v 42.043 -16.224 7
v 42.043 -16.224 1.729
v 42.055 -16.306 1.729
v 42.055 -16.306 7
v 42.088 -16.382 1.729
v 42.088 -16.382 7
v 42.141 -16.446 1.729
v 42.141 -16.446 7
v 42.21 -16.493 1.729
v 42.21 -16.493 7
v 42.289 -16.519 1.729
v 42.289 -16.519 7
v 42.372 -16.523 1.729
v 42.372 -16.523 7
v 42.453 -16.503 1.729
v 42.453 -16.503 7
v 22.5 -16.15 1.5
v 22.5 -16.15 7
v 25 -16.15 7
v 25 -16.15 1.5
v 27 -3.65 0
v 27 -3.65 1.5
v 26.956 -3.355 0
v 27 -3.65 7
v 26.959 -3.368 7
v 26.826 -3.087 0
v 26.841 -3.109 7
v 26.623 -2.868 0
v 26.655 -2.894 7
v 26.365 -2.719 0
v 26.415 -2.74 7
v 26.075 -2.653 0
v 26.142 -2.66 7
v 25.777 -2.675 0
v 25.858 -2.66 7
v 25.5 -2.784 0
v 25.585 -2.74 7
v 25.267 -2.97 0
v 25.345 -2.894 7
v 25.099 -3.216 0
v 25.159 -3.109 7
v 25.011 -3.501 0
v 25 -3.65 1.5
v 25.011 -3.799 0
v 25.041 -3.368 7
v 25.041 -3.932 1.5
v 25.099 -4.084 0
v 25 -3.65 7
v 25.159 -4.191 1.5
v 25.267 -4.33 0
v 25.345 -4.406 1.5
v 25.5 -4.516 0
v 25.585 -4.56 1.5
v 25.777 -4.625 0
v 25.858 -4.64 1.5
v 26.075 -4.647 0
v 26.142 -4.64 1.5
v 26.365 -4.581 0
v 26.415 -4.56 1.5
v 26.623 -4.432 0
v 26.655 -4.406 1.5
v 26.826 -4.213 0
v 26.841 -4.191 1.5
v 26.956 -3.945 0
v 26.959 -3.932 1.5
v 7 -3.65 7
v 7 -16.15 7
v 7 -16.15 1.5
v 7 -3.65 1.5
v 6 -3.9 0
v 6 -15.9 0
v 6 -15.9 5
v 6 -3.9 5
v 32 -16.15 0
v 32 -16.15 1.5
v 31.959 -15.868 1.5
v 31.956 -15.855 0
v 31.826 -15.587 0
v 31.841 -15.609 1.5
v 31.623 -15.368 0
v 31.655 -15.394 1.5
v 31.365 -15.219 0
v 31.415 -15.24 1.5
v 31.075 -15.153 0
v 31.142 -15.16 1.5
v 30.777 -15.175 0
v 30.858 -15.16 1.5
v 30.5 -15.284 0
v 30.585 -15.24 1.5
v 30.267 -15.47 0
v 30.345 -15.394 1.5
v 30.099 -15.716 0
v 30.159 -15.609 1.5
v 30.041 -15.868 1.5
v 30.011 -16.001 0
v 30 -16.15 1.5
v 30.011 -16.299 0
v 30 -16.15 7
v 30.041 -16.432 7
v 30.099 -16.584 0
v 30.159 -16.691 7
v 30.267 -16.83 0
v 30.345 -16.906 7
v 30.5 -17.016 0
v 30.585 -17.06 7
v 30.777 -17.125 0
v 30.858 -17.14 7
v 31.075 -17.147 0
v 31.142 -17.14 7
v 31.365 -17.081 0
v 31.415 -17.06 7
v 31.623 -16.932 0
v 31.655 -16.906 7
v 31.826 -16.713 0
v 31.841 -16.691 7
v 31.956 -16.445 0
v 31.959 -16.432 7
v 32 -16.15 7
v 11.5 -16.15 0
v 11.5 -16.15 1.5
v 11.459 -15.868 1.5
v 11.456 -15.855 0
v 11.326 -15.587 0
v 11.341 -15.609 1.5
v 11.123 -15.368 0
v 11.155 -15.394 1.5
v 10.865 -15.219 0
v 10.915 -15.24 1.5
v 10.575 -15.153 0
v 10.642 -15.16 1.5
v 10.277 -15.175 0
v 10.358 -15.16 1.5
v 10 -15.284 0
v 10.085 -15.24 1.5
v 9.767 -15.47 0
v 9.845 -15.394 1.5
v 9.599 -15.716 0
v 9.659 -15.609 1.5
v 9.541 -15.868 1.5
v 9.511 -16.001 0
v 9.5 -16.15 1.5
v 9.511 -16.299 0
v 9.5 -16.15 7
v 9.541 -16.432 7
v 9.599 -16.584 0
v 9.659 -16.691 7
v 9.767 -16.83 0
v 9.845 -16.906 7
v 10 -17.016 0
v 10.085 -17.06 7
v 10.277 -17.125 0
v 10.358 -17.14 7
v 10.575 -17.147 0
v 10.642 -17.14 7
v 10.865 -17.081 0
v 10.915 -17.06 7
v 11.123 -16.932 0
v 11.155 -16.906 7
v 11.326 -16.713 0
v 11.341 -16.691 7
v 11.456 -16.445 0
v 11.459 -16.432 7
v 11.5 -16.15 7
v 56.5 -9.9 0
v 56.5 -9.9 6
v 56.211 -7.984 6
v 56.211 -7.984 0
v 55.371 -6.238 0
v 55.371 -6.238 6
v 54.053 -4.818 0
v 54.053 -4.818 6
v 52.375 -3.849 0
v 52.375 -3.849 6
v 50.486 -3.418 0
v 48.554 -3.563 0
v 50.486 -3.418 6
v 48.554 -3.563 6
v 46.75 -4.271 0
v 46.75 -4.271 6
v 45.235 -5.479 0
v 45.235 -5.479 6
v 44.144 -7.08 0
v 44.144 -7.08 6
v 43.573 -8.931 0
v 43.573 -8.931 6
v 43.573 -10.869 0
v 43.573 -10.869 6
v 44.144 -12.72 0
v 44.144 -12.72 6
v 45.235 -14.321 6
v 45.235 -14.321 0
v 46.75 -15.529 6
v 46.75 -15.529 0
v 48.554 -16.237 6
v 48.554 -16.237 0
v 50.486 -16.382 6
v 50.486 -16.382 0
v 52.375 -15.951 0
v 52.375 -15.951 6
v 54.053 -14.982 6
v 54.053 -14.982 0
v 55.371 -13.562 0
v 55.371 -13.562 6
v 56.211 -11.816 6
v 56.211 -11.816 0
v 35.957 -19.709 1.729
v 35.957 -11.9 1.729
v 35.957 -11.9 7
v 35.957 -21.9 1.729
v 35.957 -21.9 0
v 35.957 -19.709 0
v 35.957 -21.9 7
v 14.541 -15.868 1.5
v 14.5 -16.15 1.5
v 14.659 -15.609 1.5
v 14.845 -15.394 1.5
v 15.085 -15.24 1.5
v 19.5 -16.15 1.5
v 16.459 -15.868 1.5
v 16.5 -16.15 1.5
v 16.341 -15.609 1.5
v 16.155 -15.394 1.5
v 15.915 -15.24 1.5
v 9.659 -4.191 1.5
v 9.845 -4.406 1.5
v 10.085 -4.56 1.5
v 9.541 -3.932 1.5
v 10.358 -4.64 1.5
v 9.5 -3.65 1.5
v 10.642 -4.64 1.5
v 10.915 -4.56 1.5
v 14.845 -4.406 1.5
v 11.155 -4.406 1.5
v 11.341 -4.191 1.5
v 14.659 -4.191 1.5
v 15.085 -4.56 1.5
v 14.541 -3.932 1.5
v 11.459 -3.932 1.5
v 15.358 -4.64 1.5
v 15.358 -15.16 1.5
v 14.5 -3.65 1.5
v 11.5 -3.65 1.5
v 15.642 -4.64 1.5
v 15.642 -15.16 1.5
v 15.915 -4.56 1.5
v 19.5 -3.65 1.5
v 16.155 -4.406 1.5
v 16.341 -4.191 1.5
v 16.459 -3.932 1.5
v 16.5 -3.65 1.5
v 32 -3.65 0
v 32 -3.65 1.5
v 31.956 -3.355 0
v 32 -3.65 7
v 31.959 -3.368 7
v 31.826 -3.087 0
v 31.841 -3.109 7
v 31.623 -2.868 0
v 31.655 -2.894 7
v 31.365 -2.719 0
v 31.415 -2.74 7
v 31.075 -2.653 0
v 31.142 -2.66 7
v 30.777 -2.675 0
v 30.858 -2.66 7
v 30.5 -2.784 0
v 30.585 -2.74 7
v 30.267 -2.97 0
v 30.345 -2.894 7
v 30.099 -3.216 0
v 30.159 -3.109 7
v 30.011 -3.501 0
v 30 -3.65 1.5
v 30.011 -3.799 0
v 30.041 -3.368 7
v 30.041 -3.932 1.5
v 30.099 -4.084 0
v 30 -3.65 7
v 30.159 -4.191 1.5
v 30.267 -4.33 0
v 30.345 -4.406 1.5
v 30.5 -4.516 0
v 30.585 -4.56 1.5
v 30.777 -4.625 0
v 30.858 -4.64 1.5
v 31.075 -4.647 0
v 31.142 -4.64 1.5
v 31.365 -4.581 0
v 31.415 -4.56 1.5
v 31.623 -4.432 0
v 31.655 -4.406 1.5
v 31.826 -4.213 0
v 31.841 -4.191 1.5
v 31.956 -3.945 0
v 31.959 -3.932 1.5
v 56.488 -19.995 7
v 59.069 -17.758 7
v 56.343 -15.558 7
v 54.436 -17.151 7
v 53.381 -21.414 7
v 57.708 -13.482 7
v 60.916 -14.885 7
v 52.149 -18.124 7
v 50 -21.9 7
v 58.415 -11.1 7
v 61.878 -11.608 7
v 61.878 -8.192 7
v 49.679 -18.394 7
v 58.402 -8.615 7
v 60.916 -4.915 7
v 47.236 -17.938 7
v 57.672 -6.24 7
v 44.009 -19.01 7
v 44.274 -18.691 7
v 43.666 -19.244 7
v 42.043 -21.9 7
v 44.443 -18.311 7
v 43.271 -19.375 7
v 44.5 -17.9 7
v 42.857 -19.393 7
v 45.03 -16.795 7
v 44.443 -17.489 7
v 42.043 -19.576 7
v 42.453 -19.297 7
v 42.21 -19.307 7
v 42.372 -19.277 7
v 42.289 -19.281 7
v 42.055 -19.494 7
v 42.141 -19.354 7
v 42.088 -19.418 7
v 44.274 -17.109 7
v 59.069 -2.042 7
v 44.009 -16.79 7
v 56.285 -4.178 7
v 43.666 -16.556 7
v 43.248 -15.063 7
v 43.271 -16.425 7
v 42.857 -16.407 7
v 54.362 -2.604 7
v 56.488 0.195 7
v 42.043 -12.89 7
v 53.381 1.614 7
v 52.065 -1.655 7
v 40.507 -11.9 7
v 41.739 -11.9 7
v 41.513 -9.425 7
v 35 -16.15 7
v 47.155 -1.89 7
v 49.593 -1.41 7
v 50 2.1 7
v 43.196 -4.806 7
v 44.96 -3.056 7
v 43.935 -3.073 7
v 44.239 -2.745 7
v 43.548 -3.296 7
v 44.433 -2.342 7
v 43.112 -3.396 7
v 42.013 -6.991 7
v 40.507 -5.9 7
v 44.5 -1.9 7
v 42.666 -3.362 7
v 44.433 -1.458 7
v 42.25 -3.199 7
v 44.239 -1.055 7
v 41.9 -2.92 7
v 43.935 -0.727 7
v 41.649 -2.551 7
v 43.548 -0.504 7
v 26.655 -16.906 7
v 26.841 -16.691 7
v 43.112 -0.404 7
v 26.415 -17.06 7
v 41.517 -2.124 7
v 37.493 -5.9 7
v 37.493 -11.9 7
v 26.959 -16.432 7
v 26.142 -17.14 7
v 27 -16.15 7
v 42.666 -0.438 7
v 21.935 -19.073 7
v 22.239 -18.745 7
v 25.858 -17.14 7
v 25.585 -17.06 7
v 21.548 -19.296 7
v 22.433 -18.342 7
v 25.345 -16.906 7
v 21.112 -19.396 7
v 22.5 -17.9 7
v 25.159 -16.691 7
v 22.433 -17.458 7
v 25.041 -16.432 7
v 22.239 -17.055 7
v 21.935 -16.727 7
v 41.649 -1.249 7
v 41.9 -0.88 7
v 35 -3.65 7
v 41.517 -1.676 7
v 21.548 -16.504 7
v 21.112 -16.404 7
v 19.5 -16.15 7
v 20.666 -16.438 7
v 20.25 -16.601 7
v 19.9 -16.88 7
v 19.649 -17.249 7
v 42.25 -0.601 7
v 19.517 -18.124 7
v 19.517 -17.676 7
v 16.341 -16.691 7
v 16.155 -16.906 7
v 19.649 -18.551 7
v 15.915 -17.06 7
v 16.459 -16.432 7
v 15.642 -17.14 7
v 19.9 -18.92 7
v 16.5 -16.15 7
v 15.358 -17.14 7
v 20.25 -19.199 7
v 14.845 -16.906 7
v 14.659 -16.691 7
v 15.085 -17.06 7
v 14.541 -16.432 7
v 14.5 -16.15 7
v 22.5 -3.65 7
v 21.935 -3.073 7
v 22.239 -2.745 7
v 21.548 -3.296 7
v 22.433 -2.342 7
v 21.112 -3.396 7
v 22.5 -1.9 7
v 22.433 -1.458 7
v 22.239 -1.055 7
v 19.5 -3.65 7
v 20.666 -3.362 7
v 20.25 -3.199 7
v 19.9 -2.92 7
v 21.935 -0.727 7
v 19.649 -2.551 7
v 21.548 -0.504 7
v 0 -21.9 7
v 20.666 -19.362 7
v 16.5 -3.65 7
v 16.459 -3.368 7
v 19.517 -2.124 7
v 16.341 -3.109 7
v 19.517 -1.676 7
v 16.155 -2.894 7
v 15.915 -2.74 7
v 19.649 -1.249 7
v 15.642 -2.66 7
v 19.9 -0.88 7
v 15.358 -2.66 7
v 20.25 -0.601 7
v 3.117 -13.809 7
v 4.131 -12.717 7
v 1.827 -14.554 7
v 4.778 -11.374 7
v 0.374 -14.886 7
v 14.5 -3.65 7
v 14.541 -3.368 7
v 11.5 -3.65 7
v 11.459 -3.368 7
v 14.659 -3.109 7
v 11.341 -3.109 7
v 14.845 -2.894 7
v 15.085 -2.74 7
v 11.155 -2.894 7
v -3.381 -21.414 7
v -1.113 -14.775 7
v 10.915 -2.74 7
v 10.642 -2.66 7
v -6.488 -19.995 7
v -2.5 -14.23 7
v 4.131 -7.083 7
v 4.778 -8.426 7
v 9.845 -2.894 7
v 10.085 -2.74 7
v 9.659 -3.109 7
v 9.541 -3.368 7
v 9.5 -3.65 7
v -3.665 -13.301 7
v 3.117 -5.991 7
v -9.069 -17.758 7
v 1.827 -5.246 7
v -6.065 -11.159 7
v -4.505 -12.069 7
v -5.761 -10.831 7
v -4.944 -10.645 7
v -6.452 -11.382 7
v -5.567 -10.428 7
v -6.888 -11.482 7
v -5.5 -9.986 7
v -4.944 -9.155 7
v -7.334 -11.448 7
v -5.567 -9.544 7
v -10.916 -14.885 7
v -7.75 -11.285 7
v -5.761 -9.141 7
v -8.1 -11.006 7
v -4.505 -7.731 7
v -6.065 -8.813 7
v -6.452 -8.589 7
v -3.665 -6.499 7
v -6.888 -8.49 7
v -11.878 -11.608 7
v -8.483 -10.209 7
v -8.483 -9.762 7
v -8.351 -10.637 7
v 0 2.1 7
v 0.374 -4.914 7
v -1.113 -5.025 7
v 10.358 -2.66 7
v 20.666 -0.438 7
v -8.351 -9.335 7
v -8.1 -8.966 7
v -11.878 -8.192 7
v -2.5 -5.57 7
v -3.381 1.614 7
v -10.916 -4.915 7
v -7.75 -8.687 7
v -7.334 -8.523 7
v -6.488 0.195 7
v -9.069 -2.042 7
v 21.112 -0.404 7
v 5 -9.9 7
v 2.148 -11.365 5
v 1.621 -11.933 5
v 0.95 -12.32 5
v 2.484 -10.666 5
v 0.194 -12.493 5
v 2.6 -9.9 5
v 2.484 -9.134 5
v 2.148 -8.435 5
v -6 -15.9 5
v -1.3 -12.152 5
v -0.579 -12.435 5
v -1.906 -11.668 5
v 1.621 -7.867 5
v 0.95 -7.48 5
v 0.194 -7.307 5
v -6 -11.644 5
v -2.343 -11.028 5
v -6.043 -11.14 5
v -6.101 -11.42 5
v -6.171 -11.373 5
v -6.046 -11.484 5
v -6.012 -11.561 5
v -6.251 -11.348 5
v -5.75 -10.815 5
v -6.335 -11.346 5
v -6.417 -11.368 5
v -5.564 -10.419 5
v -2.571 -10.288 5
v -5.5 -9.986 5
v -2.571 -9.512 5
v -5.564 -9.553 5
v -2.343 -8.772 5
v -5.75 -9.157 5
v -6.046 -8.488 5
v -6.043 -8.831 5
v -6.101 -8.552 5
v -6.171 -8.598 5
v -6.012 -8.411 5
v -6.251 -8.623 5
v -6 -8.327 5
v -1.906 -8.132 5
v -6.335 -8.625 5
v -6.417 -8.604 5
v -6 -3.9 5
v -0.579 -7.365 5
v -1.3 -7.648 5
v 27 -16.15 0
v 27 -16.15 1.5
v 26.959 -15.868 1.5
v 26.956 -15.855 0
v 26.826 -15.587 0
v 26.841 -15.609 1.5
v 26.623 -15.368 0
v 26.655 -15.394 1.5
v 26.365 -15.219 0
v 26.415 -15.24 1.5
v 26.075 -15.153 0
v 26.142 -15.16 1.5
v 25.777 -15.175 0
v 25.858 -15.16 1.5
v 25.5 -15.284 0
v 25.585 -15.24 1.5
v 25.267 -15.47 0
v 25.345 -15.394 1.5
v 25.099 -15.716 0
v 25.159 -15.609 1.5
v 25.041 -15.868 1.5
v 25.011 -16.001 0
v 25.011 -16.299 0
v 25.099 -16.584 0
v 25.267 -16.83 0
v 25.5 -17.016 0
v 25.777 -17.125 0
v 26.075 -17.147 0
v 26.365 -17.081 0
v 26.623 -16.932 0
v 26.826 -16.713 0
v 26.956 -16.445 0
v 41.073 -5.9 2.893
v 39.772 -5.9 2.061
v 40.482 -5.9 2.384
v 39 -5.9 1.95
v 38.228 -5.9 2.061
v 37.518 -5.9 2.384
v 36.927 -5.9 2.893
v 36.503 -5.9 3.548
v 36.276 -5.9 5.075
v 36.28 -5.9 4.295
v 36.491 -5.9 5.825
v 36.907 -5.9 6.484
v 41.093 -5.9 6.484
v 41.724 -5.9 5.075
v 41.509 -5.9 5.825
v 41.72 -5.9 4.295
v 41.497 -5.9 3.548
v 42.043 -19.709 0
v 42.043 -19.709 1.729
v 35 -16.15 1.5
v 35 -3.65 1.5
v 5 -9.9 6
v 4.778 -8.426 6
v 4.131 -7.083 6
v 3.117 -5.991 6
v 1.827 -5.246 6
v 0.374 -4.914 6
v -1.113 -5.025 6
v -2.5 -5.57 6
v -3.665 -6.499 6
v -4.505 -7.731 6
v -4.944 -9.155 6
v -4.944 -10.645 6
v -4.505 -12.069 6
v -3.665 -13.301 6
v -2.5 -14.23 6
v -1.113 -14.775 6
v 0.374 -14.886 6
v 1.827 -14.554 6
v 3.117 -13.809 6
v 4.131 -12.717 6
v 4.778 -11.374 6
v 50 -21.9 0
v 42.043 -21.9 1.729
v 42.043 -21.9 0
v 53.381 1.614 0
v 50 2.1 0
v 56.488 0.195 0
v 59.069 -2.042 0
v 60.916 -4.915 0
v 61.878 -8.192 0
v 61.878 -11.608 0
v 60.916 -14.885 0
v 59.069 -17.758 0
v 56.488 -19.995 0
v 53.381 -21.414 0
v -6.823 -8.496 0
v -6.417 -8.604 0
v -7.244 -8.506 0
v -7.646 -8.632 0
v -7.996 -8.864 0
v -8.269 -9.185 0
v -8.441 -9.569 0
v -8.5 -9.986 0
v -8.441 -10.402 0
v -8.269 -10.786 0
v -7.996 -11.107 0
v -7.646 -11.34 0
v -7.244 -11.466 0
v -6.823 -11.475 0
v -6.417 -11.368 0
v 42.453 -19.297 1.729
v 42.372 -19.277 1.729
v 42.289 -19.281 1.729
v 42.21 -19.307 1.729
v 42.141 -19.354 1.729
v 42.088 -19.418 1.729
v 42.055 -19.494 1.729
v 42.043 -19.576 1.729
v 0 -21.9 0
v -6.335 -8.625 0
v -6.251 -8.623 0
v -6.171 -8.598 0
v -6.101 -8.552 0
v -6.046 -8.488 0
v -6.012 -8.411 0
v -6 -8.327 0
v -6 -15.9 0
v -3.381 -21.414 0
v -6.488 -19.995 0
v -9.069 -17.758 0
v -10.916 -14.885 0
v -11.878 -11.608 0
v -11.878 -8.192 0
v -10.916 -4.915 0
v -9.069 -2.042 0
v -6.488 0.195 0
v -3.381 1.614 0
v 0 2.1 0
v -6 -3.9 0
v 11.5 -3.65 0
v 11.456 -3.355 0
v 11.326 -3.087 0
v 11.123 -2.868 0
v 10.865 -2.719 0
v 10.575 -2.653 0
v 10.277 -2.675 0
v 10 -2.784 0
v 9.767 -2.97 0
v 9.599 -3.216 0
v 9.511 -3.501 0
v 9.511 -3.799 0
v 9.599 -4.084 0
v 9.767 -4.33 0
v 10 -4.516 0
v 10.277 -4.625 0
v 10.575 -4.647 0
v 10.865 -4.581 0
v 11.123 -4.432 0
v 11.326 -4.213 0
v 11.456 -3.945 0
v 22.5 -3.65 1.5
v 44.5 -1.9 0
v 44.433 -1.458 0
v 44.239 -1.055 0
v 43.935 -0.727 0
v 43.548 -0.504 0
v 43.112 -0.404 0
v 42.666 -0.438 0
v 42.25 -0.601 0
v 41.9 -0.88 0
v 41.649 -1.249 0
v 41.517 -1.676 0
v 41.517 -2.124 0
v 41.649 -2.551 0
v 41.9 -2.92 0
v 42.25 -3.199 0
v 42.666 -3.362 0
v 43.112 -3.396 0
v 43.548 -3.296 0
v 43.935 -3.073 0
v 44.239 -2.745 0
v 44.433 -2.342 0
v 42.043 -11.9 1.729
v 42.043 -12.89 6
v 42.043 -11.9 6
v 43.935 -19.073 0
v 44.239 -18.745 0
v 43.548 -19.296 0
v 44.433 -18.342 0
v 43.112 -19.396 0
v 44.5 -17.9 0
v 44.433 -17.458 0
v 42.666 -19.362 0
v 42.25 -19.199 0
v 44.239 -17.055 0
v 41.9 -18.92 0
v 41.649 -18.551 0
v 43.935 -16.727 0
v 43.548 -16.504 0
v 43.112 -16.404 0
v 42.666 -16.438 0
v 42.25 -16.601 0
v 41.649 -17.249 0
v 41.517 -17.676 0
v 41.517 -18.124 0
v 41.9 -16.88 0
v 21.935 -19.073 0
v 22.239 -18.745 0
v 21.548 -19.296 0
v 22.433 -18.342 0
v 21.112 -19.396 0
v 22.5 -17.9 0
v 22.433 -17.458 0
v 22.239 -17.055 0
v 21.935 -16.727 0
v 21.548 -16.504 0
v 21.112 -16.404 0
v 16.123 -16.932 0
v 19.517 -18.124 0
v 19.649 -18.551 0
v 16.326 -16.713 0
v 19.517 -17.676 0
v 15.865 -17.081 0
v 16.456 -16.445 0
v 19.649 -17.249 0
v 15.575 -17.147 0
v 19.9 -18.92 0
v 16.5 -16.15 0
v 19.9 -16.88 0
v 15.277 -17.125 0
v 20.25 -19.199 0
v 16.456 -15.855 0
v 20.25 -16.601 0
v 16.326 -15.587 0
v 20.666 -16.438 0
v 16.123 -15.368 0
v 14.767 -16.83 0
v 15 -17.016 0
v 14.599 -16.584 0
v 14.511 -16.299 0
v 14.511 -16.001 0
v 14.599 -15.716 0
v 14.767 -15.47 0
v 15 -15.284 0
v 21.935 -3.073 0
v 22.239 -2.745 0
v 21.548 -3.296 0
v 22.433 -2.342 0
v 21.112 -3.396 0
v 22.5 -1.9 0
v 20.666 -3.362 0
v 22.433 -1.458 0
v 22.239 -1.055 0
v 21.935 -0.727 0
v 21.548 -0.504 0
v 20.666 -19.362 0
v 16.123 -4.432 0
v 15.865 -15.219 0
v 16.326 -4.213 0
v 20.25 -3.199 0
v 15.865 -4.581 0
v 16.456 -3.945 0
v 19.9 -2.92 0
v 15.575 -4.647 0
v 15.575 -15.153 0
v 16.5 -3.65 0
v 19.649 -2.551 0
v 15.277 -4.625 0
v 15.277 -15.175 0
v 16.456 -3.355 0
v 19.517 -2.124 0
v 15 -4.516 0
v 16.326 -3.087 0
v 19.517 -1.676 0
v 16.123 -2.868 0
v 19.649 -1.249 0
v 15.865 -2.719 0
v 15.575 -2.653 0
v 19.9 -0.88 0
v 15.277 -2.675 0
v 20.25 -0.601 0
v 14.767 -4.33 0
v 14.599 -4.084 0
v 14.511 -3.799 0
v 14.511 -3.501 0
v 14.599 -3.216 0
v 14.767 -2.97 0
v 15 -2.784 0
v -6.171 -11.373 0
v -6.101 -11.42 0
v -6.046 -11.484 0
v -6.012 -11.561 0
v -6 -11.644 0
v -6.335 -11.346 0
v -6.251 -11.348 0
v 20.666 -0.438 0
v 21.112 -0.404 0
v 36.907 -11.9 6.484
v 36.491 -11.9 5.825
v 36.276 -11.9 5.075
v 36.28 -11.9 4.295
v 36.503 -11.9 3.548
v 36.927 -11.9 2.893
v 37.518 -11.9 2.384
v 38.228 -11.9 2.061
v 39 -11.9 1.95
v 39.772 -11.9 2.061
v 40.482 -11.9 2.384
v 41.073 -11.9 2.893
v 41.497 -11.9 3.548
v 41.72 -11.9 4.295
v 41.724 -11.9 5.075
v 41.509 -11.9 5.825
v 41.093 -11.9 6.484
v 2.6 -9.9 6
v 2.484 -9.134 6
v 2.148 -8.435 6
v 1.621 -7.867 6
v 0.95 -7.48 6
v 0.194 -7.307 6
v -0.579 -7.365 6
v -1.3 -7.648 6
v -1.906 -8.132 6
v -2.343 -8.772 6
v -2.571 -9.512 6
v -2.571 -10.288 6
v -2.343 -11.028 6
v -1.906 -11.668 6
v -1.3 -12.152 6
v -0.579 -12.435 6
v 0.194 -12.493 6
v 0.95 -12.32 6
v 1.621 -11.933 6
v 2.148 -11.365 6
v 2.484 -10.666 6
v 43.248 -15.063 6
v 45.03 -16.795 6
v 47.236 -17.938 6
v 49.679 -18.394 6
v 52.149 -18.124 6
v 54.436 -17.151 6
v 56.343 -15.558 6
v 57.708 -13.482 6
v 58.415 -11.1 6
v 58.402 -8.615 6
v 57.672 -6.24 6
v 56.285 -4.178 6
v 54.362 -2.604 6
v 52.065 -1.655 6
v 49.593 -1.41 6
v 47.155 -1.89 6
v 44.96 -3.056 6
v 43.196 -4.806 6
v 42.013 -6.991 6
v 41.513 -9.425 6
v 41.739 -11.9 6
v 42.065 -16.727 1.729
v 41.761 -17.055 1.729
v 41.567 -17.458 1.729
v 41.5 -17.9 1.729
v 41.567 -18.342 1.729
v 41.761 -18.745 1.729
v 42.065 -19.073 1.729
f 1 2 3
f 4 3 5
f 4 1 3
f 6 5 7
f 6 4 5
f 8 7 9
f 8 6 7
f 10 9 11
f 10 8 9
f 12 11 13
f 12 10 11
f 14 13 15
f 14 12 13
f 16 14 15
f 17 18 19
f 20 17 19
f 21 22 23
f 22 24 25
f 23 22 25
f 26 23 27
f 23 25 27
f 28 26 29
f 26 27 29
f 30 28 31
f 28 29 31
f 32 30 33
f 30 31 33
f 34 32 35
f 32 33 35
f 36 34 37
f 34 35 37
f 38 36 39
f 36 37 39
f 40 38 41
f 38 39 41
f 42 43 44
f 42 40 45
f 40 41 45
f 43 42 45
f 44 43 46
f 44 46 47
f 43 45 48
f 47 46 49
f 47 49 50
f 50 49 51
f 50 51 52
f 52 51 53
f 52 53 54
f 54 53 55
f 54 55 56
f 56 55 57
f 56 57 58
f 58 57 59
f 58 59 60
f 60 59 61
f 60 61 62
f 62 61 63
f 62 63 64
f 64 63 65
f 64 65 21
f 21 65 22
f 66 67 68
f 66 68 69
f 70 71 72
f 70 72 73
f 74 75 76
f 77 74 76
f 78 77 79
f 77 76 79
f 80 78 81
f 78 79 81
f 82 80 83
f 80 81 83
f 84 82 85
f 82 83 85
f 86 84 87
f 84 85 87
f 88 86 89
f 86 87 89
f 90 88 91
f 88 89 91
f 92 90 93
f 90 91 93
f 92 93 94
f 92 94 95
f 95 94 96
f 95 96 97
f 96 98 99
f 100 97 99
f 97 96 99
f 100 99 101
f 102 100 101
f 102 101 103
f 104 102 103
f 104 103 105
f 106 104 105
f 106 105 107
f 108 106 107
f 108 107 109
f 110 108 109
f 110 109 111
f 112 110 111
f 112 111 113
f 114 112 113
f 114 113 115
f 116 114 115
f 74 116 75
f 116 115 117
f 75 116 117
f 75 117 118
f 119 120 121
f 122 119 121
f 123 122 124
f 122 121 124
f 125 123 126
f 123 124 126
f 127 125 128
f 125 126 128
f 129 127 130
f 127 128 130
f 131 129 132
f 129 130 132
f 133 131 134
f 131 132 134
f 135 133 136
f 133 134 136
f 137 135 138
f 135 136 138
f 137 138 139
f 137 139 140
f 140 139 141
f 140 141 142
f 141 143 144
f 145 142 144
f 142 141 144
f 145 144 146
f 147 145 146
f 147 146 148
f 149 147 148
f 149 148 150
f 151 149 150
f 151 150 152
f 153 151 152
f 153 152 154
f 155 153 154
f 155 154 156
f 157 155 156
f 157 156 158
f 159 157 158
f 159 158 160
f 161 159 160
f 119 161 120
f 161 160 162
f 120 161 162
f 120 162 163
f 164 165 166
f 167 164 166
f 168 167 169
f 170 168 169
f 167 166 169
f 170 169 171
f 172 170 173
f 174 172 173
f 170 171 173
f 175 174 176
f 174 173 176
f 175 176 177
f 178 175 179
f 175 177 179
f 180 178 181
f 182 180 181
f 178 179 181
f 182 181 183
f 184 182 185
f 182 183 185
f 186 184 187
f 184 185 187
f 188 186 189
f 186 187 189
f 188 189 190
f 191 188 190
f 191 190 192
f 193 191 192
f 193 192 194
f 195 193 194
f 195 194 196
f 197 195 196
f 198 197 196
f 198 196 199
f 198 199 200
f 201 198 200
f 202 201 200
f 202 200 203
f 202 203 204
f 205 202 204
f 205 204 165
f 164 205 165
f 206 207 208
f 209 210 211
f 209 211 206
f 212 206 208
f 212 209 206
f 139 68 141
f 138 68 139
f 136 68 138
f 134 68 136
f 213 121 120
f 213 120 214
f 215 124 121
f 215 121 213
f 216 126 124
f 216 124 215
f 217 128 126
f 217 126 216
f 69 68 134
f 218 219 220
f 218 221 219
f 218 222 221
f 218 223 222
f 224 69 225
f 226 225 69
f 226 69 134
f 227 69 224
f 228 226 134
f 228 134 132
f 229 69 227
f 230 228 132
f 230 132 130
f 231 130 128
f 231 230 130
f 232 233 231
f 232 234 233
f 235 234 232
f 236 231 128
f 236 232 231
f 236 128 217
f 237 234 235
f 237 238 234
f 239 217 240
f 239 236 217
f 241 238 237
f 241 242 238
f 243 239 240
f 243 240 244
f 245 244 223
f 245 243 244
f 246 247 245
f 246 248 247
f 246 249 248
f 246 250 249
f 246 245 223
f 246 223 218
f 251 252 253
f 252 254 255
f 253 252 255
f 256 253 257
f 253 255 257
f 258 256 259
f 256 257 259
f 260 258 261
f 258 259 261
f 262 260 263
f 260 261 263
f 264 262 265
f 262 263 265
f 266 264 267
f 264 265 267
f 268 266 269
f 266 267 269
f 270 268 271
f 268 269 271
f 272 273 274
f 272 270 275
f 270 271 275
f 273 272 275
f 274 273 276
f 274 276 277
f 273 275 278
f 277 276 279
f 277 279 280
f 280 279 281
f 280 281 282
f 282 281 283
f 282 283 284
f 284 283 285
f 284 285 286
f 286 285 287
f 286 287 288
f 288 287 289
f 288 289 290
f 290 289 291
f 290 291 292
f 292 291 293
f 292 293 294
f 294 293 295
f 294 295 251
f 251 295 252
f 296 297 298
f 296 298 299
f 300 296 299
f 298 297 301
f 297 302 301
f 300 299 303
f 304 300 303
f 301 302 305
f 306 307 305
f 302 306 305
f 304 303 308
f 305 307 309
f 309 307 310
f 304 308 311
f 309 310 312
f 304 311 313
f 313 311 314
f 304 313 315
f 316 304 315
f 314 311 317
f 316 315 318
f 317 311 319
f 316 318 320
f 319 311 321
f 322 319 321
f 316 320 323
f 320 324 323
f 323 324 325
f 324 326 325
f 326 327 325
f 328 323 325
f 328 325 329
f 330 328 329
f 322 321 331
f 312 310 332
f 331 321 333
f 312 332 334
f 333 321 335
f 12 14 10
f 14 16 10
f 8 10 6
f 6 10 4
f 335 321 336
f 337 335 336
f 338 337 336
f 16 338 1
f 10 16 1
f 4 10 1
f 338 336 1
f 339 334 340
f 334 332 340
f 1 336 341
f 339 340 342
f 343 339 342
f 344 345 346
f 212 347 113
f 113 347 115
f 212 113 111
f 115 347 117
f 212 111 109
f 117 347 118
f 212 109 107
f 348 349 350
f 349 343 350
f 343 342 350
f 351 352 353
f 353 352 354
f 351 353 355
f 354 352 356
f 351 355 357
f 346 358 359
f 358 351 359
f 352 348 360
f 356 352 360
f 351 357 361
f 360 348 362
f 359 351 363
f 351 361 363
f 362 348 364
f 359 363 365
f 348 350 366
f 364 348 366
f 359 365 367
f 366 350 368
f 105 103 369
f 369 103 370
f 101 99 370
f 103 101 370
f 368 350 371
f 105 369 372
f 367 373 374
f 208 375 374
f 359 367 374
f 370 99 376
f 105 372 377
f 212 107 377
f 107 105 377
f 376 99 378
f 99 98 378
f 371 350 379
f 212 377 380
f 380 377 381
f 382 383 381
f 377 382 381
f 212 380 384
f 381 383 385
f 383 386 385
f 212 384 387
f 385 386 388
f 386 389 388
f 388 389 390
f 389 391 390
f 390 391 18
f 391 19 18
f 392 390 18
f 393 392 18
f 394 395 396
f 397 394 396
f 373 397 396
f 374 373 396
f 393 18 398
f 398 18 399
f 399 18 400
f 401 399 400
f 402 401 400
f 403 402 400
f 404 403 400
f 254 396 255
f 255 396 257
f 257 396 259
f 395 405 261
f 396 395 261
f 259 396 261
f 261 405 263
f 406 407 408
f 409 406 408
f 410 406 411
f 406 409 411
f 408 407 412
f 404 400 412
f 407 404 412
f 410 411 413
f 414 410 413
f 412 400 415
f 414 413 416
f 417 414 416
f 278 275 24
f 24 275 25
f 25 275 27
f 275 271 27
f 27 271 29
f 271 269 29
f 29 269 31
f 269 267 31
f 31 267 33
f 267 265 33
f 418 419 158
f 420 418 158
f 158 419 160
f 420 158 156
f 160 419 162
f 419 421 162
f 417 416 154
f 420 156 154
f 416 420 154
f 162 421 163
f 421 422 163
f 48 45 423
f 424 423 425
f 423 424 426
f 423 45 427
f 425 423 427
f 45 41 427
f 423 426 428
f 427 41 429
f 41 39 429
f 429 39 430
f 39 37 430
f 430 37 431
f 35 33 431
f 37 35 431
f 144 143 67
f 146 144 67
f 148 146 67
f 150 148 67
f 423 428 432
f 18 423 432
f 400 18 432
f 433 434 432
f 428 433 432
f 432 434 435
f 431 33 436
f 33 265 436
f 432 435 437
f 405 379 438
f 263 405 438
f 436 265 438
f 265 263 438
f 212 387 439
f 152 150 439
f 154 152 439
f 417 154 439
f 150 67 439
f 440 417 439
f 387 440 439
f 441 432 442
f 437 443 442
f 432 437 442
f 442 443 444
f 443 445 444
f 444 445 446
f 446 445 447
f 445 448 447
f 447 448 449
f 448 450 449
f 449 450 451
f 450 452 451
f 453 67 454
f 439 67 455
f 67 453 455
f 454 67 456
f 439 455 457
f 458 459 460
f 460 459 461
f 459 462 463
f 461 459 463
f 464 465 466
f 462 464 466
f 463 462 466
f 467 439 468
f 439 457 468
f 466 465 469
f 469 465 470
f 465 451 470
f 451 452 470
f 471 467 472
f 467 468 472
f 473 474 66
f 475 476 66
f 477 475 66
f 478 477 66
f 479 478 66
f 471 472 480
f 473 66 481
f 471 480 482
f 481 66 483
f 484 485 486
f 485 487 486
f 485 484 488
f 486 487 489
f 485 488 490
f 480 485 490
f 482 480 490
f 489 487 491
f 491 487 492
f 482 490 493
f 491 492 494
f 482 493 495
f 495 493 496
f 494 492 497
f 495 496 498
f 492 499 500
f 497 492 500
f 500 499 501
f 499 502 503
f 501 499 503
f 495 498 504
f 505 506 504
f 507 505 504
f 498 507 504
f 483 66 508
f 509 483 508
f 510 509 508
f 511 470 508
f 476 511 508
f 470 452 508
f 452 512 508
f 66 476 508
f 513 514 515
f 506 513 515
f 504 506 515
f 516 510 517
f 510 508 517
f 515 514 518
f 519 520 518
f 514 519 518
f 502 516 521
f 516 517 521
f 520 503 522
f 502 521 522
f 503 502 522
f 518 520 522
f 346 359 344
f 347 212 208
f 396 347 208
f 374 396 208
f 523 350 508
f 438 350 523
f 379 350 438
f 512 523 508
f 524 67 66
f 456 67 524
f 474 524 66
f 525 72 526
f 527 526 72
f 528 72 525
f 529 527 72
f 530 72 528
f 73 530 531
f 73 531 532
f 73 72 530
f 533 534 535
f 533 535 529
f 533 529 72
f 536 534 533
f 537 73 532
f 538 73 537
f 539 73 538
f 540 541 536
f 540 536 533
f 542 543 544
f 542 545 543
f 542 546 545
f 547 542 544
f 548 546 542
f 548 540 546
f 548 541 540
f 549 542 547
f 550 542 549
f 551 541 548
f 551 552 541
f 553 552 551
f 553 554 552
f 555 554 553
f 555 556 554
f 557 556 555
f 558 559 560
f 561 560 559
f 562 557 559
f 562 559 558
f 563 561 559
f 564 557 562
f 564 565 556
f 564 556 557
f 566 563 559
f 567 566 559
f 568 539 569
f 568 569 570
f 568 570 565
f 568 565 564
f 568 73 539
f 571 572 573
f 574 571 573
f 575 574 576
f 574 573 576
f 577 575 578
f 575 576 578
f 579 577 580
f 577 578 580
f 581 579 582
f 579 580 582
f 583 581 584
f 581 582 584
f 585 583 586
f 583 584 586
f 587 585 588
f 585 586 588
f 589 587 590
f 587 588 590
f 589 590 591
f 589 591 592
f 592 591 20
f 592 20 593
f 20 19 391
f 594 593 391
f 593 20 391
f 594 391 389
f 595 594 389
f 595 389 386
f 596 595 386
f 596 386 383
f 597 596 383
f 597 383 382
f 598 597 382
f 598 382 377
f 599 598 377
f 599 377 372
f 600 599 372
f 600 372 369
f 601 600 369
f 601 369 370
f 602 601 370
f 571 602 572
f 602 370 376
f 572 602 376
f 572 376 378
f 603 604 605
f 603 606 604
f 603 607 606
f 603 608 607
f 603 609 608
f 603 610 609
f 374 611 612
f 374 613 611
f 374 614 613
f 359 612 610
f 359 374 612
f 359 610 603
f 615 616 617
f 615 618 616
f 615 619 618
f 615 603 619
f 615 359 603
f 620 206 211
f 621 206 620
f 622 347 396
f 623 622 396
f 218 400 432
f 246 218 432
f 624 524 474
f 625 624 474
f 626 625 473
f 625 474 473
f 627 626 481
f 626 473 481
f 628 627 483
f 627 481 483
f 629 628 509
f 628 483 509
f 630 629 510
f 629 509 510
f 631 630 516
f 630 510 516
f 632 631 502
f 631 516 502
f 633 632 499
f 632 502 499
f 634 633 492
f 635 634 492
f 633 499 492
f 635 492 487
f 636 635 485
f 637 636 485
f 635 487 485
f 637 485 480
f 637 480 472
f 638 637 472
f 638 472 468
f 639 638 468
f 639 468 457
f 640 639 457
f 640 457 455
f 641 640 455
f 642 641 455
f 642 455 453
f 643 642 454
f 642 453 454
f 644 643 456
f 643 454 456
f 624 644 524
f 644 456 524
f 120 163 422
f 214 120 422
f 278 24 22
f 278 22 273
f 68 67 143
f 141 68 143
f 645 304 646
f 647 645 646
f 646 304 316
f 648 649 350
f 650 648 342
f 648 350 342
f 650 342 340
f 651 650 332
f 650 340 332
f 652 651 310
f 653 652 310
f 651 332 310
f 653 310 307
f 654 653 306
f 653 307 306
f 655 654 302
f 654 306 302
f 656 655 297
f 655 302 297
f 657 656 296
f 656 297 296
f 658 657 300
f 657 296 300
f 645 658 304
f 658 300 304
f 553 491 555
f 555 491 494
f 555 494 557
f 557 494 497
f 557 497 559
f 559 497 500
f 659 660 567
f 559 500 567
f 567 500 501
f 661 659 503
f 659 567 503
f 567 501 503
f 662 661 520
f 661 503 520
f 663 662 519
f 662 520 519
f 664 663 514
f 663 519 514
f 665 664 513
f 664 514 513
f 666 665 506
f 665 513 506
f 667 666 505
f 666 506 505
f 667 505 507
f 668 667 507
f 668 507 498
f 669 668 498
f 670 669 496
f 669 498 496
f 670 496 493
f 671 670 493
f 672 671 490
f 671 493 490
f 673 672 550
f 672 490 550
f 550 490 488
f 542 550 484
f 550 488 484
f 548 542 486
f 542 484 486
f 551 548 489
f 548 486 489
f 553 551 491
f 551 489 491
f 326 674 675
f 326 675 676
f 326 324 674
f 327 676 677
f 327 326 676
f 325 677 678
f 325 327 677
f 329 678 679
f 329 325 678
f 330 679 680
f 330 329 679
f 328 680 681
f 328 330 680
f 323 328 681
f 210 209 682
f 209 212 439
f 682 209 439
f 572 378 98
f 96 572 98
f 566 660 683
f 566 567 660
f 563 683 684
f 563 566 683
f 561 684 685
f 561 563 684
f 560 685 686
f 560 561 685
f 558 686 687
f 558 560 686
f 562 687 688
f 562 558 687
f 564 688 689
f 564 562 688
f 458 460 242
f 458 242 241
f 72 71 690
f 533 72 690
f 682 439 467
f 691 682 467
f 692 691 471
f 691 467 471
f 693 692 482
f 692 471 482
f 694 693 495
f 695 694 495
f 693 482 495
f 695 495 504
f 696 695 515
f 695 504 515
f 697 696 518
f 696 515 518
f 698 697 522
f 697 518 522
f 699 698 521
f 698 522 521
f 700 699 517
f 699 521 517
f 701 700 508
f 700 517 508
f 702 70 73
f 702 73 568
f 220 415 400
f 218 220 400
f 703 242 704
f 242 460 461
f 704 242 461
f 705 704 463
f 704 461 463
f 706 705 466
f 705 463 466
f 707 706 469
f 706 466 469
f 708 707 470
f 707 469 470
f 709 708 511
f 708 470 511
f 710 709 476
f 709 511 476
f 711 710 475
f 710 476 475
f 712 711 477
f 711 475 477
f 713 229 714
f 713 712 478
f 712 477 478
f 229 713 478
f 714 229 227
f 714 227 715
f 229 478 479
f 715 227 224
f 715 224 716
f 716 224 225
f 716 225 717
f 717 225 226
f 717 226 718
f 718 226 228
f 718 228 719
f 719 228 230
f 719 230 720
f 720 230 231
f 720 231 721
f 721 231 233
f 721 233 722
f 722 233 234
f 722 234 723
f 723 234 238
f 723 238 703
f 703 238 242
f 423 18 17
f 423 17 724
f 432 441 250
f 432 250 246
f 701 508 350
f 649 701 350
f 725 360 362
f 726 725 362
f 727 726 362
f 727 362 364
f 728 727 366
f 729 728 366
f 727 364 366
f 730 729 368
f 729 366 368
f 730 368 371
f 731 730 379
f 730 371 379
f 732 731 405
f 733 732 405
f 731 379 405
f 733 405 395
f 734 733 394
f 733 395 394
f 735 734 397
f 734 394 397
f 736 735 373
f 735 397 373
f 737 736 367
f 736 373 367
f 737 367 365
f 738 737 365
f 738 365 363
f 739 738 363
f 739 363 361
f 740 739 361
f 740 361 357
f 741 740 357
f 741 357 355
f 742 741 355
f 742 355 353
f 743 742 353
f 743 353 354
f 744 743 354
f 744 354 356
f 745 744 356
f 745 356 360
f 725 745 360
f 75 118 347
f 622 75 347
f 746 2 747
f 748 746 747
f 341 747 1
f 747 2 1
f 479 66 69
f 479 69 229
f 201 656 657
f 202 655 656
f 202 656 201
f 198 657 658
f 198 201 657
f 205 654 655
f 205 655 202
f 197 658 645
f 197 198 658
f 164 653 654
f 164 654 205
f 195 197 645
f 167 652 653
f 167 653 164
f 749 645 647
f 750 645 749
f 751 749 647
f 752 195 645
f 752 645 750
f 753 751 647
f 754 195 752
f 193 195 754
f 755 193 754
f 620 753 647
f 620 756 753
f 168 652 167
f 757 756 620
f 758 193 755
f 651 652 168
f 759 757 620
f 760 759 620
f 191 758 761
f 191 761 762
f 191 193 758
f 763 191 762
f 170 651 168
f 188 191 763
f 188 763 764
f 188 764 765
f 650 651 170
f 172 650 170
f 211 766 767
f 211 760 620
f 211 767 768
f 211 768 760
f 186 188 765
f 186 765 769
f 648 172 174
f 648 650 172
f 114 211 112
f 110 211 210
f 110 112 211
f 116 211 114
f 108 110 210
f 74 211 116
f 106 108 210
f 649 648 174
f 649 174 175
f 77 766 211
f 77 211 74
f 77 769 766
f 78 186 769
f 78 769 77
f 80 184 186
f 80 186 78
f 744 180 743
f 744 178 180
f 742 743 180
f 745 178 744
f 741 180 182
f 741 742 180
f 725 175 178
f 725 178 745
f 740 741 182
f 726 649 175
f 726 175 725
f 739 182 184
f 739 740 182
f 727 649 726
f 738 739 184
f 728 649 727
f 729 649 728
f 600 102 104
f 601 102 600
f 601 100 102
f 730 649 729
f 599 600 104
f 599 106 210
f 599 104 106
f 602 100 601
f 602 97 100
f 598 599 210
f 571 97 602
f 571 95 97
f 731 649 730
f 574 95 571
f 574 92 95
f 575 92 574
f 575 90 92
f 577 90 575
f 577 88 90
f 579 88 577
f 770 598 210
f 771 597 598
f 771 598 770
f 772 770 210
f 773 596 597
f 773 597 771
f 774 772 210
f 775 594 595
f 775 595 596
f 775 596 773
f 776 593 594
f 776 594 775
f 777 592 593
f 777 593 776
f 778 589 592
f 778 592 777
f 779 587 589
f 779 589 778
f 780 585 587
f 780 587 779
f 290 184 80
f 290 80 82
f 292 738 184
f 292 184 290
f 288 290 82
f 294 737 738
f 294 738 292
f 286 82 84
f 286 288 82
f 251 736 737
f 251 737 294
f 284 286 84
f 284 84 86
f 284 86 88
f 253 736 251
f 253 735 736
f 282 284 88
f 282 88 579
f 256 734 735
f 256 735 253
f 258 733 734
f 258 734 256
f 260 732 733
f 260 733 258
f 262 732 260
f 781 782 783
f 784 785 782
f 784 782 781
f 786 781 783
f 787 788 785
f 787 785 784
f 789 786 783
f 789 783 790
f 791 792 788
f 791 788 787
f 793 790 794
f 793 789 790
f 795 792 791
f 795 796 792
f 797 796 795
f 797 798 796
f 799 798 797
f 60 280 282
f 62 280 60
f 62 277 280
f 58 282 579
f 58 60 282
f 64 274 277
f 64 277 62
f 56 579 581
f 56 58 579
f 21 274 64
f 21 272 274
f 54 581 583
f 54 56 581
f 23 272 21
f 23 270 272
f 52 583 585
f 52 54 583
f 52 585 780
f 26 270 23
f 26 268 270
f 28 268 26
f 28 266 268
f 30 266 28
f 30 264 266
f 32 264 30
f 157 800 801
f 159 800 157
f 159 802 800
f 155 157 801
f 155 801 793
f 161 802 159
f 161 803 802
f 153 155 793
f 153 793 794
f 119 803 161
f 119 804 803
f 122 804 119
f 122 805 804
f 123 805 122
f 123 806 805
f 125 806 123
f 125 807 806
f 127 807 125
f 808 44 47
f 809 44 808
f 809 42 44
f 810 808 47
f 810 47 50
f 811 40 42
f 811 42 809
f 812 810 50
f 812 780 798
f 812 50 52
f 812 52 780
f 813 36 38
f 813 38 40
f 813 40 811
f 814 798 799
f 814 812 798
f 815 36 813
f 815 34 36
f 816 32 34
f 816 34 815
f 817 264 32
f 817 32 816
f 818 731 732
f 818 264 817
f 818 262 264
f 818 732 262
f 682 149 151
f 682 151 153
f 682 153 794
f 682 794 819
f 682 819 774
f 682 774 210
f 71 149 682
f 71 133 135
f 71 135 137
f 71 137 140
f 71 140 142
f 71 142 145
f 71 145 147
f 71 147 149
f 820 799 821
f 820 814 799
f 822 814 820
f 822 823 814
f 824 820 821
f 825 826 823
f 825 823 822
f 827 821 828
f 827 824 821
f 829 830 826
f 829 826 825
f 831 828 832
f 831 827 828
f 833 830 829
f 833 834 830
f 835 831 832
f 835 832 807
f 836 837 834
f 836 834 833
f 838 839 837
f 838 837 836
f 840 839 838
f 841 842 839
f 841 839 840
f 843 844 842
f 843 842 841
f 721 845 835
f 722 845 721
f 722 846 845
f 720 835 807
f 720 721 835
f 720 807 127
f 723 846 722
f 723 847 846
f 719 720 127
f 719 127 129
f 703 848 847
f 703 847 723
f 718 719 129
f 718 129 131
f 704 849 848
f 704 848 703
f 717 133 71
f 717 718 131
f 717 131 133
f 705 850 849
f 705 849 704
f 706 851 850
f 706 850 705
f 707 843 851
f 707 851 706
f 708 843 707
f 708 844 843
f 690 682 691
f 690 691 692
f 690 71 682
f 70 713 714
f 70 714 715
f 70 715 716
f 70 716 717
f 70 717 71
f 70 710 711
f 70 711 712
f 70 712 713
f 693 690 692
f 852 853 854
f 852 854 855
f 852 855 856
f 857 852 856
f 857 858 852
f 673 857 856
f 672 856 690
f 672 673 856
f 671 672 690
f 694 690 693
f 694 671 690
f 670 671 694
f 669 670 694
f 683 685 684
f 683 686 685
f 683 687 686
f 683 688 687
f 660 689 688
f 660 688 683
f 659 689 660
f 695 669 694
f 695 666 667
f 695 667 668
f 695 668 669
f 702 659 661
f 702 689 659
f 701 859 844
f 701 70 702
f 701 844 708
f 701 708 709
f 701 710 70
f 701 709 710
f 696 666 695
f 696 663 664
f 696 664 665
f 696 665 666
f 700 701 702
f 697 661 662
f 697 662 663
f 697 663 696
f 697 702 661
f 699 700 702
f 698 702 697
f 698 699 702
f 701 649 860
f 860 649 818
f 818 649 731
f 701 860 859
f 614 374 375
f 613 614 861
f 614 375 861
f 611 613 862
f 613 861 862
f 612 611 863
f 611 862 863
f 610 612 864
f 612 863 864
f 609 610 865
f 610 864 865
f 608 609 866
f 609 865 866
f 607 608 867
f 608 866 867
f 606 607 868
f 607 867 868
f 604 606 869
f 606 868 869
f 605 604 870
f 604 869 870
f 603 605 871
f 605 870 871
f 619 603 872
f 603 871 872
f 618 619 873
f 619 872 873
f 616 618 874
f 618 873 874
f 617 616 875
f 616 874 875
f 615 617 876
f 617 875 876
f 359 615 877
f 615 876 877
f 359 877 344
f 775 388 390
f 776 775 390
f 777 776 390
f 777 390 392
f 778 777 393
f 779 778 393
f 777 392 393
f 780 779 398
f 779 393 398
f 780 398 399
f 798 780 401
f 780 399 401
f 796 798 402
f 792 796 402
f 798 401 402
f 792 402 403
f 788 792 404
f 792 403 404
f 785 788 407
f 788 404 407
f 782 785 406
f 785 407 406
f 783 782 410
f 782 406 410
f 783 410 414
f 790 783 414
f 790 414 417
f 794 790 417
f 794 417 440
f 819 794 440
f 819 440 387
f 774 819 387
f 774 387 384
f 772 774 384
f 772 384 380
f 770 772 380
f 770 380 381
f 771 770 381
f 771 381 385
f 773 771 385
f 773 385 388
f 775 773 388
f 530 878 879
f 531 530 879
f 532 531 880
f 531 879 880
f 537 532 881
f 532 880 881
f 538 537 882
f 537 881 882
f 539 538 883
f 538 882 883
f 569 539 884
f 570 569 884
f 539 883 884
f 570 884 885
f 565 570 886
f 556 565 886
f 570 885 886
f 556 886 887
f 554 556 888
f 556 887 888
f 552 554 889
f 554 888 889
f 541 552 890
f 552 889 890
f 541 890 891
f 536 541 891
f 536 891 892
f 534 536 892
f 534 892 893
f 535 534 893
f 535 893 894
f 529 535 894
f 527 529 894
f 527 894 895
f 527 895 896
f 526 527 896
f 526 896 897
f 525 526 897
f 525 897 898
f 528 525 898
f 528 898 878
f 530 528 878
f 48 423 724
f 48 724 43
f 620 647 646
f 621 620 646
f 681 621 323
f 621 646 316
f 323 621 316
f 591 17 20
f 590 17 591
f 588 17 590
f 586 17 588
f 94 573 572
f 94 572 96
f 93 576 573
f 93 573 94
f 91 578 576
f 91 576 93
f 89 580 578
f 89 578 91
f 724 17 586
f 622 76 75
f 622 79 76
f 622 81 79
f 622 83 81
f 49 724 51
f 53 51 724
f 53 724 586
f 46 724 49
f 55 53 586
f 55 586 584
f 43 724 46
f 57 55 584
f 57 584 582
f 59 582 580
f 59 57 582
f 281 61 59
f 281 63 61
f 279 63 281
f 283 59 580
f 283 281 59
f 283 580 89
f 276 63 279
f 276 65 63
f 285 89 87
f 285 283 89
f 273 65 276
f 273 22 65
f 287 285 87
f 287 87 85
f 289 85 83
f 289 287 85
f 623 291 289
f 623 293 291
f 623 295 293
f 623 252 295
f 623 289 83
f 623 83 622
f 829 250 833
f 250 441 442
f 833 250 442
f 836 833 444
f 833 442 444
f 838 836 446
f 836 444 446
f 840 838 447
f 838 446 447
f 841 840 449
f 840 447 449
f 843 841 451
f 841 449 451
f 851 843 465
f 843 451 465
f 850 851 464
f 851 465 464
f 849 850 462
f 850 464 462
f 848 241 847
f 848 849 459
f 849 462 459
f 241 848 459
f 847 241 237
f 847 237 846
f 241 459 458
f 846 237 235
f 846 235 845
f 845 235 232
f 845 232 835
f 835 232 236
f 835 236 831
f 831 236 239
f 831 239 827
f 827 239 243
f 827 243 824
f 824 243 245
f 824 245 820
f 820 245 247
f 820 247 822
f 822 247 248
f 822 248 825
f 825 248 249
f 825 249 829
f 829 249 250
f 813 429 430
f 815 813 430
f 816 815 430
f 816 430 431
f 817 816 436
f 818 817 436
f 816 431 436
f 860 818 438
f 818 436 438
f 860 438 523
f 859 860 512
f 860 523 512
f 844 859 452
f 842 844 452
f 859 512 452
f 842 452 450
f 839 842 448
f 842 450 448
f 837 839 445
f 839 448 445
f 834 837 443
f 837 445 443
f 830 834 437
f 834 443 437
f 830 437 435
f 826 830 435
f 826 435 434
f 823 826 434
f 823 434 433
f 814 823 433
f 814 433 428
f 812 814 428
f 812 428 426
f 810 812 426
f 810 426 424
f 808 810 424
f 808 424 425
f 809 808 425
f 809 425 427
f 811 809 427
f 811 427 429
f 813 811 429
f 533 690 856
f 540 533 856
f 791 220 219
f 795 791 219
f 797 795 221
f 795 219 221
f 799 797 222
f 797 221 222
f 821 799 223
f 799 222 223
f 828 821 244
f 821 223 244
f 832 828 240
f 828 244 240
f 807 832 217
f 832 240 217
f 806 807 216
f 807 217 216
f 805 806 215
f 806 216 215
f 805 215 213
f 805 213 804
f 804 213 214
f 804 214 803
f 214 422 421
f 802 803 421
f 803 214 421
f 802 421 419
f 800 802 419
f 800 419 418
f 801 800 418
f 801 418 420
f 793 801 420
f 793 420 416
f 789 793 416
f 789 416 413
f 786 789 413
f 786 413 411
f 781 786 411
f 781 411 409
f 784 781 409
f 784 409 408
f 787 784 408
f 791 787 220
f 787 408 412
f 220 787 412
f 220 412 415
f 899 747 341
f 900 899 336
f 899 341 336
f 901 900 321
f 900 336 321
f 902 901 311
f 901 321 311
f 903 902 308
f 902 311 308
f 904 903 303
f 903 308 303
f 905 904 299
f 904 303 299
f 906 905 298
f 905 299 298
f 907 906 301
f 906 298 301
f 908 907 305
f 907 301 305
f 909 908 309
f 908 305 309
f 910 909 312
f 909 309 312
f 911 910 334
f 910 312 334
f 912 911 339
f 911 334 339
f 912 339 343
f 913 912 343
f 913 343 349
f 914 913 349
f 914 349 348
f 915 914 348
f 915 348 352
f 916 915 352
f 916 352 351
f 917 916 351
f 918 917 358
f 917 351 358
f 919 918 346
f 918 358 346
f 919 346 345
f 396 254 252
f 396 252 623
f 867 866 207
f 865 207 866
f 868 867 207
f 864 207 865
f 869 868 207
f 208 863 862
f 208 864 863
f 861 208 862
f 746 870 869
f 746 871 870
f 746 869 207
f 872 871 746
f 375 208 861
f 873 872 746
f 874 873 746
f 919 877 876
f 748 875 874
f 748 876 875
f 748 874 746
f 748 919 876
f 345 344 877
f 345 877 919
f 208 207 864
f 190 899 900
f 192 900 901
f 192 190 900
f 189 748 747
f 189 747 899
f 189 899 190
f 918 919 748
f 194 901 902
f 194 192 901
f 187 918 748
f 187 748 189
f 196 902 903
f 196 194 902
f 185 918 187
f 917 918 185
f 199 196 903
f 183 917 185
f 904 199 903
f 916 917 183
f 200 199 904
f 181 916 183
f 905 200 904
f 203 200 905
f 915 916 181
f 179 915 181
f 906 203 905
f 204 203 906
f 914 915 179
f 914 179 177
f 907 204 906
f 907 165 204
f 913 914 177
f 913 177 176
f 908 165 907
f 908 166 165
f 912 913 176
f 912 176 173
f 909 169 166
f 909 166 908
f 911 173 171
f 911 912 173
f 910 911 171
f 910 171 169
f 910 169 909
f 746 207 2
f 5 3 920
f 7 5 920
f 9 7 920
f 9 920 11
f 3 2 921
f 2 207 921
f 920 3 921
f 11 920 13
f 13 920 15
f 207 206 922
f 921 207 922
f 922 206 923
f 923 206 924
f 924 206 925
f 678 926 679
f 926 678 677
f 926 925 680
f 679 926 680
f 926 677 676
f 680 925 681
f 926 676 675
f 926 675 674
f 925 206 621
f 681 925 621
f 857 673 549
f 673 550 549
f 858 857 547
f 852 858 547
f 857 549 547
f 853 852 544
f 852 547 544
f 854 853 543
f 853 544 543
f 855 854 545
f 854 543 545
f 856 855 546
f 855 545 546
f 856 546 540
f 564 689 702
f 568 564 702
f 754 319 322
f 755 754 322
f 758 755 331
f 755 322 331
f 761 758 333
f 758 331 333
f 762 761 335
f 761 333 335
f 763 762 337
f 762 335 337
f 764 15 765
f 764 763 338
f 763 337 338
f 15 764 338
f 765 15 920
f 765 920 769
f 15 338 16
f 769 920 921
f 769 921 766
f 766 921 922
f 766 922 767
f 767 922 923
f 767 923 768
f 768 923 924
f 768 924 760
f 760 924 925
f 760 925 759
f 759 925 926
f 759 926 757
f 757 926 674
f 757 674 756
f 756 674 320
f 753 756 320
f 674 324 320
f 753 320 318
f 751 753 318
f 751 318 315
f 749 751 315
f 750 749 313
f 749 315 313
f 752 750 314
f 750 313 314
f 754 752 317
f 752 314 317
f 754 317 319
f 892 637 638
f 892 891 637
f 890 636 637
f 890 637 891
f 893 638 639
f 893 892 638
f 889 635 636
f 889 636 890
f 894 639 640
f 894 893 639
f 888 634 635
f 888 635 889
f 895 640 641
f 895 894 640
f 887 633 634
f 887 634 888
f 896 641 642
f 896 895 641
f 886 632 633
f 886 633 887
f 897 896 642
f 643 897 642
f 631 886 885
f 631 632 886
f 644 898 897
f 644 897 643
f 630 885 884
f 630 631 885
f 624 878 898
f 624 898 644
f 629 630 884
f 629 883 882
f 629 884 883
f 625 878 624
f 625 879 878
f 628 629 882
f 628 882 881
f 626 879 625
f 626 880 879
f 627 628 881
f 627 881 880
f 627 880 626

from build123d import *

# Parameters (mm, degrees)
EXTRUDE_1_DEPTH      = 7
SKETCH_4_W           = 12.5
SKETCH_4_H           = 12.5
CUT_EXTRUDE_1_DEPTH  = 5.5
SKETCH_5_R           = 2.6
SKETCH_5_R_2         = 6.5
CUT_EXTRUDE_2_DEPTH  = 64.474798149
SKETCH_6_R           = 1
CUT_EXTRUDE_3_DEPTH  = 64.474798149
EXTRUDE_2_DEPTH      = 7
SKETCH_9_W           = 12
SKETCH_9_H           = 12
CUT_EXTRUDE_5_DEPTH  = 5
SKETCH_10_R          = 2.75
CUT_EXTRUDE_6_DEPTH  = 16
SKETCH_11_W          = 6.086395164
SKETCH_11_H          = 5.94224859
CUT_EXTRUDE_7_DEPTH  = 10
SKETCH_13_W          = 6.086395164
SKETCH_13_H          = 2.190675797
CUT_EXTRUDE_8_DEPTH  = 10
SKETCH_14_R          = 1.5
CUT_EXTRUDE_9_DEPTH  = 10
FILLET_1_R           = 0.3
FILLET_2_R           = 0.3
SKETCH_15_R          = 5
SKETCH_15_R_2        = 8.5
CUT_EXTRUDE_10_DEPTH = 1


with BuildPart() as part:
    # Эскиз1 → Бобышка-Вытянуть1 (new body)
    with BuildSketch(Plane.XY):
        with BuildLine():
            Line((0, 0), (50, 0))
            ThreePointArc((50, 0), (59.9, -9.9), (50, -19.8))
            Line((50, -19.8), (0, -19.8))
            ThreePointArc((0, -19.8), (-9.9, -9.9), (0, 0))
        make_face()
    extrude(amount=EXTRUDE_1_DEPTH)

    # Эскиз4 → Вырез-Вытянуть1 (cut)
    with BuildSketch(Plane.XY.offset(7)):
        with Locations((13.25, -9.9)):
            Rectangle(SKETCH_4_W, SKETCH_4_H)
        with Locations((28.75, -9.9)):
            Rectangle(SKETCH_4_W, SKETCH_4_H)
    extrude(amount=-CUT_EXTRUDE_1_DEPTH, mode=Mode.SUBTRACT)

    # Эскиз5 → Вырез-Вытянуть2 (cut, through all)
    with BuildSketch(Plane.XY.offset(7)):
        with Locations((0, -9.9)):
            Circle(SKETCH_5_R)
        with Locations((50, -9.9)):
            Circle(SKETCH_5_R_2)
    extrude(amount=-CUT_EXTRUDE_2_DEPTH, mode=Mode.SUBTRACT)

    # Эскиз6 → Вырез-Вытянуть3 (cut, through all)
    with BuildSketch(Plane.XY.offset(7)):
        with Locations((10.5, -3.65)):
            Circle(SKETCH_6_R)
        with Locations((15.5, -3.65)):
            Circle(SKETCH_6_R)
        with Locations((26, -3.65)):
            Circle(SKETCH_6_R)
        with Locations((31, -3.65)):
            Circle(SKETCH_6_R)
        with Locations((10.5, -16.15)):
            Circle(SKETCH_6_R)
        with Locations((15.5, -16.15)):
            Circle(SKETCH_6_R)
        with Locations((26, -16.15)):
            Circle(SKETCH_6_R)
        with Locations((31, -16.15)):
            Circle(SKETCH_6_R)
    extrude(amount=-CUT_EXTRUDE_3_DEPTH, mode=Mode.SUBTRACT)

    # Эскиз8 → Бобышка-Вытянуть2 (add)
    with BuildSketch(Plane.XY.offset(7)):
        with BuildLine():
            Line((0, 2.1), (50, 2.1))
            ThreePointArc((50, 2.1), (62, -9.9), (50, -21.9))
            Line((50, -21.9), (0, -21.9))
            ThreePointArc((0, -21.9), (-12, -9.9), (0, 2.1))
        make_face()
        with BuildLine():
            Line((0, -0.209438441), (50, -0.209438441))
            ThreePointArc((50, -0.209438441), (59.690561559, -9.9), (50, -19.590561559))
            Line((50, -19.590561559), (0, -19.590561559))
            ThreePointArc((0, -19.590561559), (-9.690561559, -9.9), (0, -0.209438441))
        make_face(mode=Mode.SUBTRACT)
    extrude(amount=-EXTRUDE_2_DEPTH)

    # Эскиз9 → Вырез-Вытянуть5 (cut)
    with BuildSketch(Plane(origin=(0, 0, 0), x_dir=(-1, 0, 0), z_dir=(0, 0, -1))):
        with Locations((0, -9.9)):
            Rectangle(SKETCH_9_W, SKETCH_9_H)
    extrude(amount=-CUT_EXTRUDE_5_DEPTH, mode=Mode.SUBTRACT)

    # Эскиз10 → Вырез-Вытянуть6 (cut)
    with BuildSketch(Plane.XZ.offset(21.9)):
        with Locations((39, 4.7)):
            Circle(SKETCH_10_R)
    extrude(amount=-CUT_EXTRUDE_6_DEPTH, mode=Mode.SUBTRACT)

    # Эскиз11 → Вырез-Вытянуть7 (cut)
    with BuildSketch(Plane.XZ.offset(21.9)):
        with Locations((39, 4.7)):
            Rectangle(SKETCH_11_W, SKETCH_11_H)
    extrude(amount=-CUT_EXTRUDE_7_DEPTH, mode=Mode.SUBTRACT)

    # Эскиз13 → Вырез-Вытянуть8 (cut)
    with BuildSketch(Plane.XY.offset(1.728875705)):
        with Locations((39, -20.804662101)):
            Rectangle(SKETCH_13_W, SKETCH_13_H)
    extrude(amount=-CUT_EXTRUDE_8_DEPTH, mode=Mode.SUBTRACT)

    # Эскиз14 → Вырез-Вытянуть9 (cut)
    with BuildSketch(Plane.XY.offset(7)):
        with Locations((21, -1.9)):
            Circle(SKETCH_14_R)
        with Locations((21, -17.9)):
            Circle(SKETCH_14_R)
        with Locations((43, -1.9)):
            Circle(SKETCH_14_R)
        with Locations((-7, -9.9857634)):
            Circle(SKETCH_14_R)
        with Locations((43, -17.9)):
            Circle(SKETCH_14_R)
    extrude(amount=-CUT_EXTRUDE_9_DEPTH, mode=Mode.SUBTRACT)

    # Скругление1
    fillet_1_edges = [part.edges().sort_by_distance(p)[0] for p in [
        (-6, -8.867729411, 2.5),
        (-6, -11.103797388, 2.5),
    ]]
    fillet(fillet_1_edges, radius=FILLET_1_R)

    # Скругление2
    fillet_2_edges = [part.edges().sort_by_distance(p)[0] for p in [
        (42.043197582, -16.744781781, 4.364437853),
        (42.043197582, -19.055218219, 4.364437853),
    ]]
    fillet(fillet_2_edges, radius=FILLET_2_R)

    # Эскиз15 → Вырез-Вытянуть10 (cut)
    with BuildSketch(Plane.XY.offset(7)):
        with Locations((0, -9.9)):
            Circle(SKETCH_15_R)
        with Locations((50, -9.9)):
            Circle(SKETCH_15_R_2)
    extrude(amount=-CUT_EXTRUDE_10_DEPTH, mode=Mode.SUBTRACT)


solid = part.part
